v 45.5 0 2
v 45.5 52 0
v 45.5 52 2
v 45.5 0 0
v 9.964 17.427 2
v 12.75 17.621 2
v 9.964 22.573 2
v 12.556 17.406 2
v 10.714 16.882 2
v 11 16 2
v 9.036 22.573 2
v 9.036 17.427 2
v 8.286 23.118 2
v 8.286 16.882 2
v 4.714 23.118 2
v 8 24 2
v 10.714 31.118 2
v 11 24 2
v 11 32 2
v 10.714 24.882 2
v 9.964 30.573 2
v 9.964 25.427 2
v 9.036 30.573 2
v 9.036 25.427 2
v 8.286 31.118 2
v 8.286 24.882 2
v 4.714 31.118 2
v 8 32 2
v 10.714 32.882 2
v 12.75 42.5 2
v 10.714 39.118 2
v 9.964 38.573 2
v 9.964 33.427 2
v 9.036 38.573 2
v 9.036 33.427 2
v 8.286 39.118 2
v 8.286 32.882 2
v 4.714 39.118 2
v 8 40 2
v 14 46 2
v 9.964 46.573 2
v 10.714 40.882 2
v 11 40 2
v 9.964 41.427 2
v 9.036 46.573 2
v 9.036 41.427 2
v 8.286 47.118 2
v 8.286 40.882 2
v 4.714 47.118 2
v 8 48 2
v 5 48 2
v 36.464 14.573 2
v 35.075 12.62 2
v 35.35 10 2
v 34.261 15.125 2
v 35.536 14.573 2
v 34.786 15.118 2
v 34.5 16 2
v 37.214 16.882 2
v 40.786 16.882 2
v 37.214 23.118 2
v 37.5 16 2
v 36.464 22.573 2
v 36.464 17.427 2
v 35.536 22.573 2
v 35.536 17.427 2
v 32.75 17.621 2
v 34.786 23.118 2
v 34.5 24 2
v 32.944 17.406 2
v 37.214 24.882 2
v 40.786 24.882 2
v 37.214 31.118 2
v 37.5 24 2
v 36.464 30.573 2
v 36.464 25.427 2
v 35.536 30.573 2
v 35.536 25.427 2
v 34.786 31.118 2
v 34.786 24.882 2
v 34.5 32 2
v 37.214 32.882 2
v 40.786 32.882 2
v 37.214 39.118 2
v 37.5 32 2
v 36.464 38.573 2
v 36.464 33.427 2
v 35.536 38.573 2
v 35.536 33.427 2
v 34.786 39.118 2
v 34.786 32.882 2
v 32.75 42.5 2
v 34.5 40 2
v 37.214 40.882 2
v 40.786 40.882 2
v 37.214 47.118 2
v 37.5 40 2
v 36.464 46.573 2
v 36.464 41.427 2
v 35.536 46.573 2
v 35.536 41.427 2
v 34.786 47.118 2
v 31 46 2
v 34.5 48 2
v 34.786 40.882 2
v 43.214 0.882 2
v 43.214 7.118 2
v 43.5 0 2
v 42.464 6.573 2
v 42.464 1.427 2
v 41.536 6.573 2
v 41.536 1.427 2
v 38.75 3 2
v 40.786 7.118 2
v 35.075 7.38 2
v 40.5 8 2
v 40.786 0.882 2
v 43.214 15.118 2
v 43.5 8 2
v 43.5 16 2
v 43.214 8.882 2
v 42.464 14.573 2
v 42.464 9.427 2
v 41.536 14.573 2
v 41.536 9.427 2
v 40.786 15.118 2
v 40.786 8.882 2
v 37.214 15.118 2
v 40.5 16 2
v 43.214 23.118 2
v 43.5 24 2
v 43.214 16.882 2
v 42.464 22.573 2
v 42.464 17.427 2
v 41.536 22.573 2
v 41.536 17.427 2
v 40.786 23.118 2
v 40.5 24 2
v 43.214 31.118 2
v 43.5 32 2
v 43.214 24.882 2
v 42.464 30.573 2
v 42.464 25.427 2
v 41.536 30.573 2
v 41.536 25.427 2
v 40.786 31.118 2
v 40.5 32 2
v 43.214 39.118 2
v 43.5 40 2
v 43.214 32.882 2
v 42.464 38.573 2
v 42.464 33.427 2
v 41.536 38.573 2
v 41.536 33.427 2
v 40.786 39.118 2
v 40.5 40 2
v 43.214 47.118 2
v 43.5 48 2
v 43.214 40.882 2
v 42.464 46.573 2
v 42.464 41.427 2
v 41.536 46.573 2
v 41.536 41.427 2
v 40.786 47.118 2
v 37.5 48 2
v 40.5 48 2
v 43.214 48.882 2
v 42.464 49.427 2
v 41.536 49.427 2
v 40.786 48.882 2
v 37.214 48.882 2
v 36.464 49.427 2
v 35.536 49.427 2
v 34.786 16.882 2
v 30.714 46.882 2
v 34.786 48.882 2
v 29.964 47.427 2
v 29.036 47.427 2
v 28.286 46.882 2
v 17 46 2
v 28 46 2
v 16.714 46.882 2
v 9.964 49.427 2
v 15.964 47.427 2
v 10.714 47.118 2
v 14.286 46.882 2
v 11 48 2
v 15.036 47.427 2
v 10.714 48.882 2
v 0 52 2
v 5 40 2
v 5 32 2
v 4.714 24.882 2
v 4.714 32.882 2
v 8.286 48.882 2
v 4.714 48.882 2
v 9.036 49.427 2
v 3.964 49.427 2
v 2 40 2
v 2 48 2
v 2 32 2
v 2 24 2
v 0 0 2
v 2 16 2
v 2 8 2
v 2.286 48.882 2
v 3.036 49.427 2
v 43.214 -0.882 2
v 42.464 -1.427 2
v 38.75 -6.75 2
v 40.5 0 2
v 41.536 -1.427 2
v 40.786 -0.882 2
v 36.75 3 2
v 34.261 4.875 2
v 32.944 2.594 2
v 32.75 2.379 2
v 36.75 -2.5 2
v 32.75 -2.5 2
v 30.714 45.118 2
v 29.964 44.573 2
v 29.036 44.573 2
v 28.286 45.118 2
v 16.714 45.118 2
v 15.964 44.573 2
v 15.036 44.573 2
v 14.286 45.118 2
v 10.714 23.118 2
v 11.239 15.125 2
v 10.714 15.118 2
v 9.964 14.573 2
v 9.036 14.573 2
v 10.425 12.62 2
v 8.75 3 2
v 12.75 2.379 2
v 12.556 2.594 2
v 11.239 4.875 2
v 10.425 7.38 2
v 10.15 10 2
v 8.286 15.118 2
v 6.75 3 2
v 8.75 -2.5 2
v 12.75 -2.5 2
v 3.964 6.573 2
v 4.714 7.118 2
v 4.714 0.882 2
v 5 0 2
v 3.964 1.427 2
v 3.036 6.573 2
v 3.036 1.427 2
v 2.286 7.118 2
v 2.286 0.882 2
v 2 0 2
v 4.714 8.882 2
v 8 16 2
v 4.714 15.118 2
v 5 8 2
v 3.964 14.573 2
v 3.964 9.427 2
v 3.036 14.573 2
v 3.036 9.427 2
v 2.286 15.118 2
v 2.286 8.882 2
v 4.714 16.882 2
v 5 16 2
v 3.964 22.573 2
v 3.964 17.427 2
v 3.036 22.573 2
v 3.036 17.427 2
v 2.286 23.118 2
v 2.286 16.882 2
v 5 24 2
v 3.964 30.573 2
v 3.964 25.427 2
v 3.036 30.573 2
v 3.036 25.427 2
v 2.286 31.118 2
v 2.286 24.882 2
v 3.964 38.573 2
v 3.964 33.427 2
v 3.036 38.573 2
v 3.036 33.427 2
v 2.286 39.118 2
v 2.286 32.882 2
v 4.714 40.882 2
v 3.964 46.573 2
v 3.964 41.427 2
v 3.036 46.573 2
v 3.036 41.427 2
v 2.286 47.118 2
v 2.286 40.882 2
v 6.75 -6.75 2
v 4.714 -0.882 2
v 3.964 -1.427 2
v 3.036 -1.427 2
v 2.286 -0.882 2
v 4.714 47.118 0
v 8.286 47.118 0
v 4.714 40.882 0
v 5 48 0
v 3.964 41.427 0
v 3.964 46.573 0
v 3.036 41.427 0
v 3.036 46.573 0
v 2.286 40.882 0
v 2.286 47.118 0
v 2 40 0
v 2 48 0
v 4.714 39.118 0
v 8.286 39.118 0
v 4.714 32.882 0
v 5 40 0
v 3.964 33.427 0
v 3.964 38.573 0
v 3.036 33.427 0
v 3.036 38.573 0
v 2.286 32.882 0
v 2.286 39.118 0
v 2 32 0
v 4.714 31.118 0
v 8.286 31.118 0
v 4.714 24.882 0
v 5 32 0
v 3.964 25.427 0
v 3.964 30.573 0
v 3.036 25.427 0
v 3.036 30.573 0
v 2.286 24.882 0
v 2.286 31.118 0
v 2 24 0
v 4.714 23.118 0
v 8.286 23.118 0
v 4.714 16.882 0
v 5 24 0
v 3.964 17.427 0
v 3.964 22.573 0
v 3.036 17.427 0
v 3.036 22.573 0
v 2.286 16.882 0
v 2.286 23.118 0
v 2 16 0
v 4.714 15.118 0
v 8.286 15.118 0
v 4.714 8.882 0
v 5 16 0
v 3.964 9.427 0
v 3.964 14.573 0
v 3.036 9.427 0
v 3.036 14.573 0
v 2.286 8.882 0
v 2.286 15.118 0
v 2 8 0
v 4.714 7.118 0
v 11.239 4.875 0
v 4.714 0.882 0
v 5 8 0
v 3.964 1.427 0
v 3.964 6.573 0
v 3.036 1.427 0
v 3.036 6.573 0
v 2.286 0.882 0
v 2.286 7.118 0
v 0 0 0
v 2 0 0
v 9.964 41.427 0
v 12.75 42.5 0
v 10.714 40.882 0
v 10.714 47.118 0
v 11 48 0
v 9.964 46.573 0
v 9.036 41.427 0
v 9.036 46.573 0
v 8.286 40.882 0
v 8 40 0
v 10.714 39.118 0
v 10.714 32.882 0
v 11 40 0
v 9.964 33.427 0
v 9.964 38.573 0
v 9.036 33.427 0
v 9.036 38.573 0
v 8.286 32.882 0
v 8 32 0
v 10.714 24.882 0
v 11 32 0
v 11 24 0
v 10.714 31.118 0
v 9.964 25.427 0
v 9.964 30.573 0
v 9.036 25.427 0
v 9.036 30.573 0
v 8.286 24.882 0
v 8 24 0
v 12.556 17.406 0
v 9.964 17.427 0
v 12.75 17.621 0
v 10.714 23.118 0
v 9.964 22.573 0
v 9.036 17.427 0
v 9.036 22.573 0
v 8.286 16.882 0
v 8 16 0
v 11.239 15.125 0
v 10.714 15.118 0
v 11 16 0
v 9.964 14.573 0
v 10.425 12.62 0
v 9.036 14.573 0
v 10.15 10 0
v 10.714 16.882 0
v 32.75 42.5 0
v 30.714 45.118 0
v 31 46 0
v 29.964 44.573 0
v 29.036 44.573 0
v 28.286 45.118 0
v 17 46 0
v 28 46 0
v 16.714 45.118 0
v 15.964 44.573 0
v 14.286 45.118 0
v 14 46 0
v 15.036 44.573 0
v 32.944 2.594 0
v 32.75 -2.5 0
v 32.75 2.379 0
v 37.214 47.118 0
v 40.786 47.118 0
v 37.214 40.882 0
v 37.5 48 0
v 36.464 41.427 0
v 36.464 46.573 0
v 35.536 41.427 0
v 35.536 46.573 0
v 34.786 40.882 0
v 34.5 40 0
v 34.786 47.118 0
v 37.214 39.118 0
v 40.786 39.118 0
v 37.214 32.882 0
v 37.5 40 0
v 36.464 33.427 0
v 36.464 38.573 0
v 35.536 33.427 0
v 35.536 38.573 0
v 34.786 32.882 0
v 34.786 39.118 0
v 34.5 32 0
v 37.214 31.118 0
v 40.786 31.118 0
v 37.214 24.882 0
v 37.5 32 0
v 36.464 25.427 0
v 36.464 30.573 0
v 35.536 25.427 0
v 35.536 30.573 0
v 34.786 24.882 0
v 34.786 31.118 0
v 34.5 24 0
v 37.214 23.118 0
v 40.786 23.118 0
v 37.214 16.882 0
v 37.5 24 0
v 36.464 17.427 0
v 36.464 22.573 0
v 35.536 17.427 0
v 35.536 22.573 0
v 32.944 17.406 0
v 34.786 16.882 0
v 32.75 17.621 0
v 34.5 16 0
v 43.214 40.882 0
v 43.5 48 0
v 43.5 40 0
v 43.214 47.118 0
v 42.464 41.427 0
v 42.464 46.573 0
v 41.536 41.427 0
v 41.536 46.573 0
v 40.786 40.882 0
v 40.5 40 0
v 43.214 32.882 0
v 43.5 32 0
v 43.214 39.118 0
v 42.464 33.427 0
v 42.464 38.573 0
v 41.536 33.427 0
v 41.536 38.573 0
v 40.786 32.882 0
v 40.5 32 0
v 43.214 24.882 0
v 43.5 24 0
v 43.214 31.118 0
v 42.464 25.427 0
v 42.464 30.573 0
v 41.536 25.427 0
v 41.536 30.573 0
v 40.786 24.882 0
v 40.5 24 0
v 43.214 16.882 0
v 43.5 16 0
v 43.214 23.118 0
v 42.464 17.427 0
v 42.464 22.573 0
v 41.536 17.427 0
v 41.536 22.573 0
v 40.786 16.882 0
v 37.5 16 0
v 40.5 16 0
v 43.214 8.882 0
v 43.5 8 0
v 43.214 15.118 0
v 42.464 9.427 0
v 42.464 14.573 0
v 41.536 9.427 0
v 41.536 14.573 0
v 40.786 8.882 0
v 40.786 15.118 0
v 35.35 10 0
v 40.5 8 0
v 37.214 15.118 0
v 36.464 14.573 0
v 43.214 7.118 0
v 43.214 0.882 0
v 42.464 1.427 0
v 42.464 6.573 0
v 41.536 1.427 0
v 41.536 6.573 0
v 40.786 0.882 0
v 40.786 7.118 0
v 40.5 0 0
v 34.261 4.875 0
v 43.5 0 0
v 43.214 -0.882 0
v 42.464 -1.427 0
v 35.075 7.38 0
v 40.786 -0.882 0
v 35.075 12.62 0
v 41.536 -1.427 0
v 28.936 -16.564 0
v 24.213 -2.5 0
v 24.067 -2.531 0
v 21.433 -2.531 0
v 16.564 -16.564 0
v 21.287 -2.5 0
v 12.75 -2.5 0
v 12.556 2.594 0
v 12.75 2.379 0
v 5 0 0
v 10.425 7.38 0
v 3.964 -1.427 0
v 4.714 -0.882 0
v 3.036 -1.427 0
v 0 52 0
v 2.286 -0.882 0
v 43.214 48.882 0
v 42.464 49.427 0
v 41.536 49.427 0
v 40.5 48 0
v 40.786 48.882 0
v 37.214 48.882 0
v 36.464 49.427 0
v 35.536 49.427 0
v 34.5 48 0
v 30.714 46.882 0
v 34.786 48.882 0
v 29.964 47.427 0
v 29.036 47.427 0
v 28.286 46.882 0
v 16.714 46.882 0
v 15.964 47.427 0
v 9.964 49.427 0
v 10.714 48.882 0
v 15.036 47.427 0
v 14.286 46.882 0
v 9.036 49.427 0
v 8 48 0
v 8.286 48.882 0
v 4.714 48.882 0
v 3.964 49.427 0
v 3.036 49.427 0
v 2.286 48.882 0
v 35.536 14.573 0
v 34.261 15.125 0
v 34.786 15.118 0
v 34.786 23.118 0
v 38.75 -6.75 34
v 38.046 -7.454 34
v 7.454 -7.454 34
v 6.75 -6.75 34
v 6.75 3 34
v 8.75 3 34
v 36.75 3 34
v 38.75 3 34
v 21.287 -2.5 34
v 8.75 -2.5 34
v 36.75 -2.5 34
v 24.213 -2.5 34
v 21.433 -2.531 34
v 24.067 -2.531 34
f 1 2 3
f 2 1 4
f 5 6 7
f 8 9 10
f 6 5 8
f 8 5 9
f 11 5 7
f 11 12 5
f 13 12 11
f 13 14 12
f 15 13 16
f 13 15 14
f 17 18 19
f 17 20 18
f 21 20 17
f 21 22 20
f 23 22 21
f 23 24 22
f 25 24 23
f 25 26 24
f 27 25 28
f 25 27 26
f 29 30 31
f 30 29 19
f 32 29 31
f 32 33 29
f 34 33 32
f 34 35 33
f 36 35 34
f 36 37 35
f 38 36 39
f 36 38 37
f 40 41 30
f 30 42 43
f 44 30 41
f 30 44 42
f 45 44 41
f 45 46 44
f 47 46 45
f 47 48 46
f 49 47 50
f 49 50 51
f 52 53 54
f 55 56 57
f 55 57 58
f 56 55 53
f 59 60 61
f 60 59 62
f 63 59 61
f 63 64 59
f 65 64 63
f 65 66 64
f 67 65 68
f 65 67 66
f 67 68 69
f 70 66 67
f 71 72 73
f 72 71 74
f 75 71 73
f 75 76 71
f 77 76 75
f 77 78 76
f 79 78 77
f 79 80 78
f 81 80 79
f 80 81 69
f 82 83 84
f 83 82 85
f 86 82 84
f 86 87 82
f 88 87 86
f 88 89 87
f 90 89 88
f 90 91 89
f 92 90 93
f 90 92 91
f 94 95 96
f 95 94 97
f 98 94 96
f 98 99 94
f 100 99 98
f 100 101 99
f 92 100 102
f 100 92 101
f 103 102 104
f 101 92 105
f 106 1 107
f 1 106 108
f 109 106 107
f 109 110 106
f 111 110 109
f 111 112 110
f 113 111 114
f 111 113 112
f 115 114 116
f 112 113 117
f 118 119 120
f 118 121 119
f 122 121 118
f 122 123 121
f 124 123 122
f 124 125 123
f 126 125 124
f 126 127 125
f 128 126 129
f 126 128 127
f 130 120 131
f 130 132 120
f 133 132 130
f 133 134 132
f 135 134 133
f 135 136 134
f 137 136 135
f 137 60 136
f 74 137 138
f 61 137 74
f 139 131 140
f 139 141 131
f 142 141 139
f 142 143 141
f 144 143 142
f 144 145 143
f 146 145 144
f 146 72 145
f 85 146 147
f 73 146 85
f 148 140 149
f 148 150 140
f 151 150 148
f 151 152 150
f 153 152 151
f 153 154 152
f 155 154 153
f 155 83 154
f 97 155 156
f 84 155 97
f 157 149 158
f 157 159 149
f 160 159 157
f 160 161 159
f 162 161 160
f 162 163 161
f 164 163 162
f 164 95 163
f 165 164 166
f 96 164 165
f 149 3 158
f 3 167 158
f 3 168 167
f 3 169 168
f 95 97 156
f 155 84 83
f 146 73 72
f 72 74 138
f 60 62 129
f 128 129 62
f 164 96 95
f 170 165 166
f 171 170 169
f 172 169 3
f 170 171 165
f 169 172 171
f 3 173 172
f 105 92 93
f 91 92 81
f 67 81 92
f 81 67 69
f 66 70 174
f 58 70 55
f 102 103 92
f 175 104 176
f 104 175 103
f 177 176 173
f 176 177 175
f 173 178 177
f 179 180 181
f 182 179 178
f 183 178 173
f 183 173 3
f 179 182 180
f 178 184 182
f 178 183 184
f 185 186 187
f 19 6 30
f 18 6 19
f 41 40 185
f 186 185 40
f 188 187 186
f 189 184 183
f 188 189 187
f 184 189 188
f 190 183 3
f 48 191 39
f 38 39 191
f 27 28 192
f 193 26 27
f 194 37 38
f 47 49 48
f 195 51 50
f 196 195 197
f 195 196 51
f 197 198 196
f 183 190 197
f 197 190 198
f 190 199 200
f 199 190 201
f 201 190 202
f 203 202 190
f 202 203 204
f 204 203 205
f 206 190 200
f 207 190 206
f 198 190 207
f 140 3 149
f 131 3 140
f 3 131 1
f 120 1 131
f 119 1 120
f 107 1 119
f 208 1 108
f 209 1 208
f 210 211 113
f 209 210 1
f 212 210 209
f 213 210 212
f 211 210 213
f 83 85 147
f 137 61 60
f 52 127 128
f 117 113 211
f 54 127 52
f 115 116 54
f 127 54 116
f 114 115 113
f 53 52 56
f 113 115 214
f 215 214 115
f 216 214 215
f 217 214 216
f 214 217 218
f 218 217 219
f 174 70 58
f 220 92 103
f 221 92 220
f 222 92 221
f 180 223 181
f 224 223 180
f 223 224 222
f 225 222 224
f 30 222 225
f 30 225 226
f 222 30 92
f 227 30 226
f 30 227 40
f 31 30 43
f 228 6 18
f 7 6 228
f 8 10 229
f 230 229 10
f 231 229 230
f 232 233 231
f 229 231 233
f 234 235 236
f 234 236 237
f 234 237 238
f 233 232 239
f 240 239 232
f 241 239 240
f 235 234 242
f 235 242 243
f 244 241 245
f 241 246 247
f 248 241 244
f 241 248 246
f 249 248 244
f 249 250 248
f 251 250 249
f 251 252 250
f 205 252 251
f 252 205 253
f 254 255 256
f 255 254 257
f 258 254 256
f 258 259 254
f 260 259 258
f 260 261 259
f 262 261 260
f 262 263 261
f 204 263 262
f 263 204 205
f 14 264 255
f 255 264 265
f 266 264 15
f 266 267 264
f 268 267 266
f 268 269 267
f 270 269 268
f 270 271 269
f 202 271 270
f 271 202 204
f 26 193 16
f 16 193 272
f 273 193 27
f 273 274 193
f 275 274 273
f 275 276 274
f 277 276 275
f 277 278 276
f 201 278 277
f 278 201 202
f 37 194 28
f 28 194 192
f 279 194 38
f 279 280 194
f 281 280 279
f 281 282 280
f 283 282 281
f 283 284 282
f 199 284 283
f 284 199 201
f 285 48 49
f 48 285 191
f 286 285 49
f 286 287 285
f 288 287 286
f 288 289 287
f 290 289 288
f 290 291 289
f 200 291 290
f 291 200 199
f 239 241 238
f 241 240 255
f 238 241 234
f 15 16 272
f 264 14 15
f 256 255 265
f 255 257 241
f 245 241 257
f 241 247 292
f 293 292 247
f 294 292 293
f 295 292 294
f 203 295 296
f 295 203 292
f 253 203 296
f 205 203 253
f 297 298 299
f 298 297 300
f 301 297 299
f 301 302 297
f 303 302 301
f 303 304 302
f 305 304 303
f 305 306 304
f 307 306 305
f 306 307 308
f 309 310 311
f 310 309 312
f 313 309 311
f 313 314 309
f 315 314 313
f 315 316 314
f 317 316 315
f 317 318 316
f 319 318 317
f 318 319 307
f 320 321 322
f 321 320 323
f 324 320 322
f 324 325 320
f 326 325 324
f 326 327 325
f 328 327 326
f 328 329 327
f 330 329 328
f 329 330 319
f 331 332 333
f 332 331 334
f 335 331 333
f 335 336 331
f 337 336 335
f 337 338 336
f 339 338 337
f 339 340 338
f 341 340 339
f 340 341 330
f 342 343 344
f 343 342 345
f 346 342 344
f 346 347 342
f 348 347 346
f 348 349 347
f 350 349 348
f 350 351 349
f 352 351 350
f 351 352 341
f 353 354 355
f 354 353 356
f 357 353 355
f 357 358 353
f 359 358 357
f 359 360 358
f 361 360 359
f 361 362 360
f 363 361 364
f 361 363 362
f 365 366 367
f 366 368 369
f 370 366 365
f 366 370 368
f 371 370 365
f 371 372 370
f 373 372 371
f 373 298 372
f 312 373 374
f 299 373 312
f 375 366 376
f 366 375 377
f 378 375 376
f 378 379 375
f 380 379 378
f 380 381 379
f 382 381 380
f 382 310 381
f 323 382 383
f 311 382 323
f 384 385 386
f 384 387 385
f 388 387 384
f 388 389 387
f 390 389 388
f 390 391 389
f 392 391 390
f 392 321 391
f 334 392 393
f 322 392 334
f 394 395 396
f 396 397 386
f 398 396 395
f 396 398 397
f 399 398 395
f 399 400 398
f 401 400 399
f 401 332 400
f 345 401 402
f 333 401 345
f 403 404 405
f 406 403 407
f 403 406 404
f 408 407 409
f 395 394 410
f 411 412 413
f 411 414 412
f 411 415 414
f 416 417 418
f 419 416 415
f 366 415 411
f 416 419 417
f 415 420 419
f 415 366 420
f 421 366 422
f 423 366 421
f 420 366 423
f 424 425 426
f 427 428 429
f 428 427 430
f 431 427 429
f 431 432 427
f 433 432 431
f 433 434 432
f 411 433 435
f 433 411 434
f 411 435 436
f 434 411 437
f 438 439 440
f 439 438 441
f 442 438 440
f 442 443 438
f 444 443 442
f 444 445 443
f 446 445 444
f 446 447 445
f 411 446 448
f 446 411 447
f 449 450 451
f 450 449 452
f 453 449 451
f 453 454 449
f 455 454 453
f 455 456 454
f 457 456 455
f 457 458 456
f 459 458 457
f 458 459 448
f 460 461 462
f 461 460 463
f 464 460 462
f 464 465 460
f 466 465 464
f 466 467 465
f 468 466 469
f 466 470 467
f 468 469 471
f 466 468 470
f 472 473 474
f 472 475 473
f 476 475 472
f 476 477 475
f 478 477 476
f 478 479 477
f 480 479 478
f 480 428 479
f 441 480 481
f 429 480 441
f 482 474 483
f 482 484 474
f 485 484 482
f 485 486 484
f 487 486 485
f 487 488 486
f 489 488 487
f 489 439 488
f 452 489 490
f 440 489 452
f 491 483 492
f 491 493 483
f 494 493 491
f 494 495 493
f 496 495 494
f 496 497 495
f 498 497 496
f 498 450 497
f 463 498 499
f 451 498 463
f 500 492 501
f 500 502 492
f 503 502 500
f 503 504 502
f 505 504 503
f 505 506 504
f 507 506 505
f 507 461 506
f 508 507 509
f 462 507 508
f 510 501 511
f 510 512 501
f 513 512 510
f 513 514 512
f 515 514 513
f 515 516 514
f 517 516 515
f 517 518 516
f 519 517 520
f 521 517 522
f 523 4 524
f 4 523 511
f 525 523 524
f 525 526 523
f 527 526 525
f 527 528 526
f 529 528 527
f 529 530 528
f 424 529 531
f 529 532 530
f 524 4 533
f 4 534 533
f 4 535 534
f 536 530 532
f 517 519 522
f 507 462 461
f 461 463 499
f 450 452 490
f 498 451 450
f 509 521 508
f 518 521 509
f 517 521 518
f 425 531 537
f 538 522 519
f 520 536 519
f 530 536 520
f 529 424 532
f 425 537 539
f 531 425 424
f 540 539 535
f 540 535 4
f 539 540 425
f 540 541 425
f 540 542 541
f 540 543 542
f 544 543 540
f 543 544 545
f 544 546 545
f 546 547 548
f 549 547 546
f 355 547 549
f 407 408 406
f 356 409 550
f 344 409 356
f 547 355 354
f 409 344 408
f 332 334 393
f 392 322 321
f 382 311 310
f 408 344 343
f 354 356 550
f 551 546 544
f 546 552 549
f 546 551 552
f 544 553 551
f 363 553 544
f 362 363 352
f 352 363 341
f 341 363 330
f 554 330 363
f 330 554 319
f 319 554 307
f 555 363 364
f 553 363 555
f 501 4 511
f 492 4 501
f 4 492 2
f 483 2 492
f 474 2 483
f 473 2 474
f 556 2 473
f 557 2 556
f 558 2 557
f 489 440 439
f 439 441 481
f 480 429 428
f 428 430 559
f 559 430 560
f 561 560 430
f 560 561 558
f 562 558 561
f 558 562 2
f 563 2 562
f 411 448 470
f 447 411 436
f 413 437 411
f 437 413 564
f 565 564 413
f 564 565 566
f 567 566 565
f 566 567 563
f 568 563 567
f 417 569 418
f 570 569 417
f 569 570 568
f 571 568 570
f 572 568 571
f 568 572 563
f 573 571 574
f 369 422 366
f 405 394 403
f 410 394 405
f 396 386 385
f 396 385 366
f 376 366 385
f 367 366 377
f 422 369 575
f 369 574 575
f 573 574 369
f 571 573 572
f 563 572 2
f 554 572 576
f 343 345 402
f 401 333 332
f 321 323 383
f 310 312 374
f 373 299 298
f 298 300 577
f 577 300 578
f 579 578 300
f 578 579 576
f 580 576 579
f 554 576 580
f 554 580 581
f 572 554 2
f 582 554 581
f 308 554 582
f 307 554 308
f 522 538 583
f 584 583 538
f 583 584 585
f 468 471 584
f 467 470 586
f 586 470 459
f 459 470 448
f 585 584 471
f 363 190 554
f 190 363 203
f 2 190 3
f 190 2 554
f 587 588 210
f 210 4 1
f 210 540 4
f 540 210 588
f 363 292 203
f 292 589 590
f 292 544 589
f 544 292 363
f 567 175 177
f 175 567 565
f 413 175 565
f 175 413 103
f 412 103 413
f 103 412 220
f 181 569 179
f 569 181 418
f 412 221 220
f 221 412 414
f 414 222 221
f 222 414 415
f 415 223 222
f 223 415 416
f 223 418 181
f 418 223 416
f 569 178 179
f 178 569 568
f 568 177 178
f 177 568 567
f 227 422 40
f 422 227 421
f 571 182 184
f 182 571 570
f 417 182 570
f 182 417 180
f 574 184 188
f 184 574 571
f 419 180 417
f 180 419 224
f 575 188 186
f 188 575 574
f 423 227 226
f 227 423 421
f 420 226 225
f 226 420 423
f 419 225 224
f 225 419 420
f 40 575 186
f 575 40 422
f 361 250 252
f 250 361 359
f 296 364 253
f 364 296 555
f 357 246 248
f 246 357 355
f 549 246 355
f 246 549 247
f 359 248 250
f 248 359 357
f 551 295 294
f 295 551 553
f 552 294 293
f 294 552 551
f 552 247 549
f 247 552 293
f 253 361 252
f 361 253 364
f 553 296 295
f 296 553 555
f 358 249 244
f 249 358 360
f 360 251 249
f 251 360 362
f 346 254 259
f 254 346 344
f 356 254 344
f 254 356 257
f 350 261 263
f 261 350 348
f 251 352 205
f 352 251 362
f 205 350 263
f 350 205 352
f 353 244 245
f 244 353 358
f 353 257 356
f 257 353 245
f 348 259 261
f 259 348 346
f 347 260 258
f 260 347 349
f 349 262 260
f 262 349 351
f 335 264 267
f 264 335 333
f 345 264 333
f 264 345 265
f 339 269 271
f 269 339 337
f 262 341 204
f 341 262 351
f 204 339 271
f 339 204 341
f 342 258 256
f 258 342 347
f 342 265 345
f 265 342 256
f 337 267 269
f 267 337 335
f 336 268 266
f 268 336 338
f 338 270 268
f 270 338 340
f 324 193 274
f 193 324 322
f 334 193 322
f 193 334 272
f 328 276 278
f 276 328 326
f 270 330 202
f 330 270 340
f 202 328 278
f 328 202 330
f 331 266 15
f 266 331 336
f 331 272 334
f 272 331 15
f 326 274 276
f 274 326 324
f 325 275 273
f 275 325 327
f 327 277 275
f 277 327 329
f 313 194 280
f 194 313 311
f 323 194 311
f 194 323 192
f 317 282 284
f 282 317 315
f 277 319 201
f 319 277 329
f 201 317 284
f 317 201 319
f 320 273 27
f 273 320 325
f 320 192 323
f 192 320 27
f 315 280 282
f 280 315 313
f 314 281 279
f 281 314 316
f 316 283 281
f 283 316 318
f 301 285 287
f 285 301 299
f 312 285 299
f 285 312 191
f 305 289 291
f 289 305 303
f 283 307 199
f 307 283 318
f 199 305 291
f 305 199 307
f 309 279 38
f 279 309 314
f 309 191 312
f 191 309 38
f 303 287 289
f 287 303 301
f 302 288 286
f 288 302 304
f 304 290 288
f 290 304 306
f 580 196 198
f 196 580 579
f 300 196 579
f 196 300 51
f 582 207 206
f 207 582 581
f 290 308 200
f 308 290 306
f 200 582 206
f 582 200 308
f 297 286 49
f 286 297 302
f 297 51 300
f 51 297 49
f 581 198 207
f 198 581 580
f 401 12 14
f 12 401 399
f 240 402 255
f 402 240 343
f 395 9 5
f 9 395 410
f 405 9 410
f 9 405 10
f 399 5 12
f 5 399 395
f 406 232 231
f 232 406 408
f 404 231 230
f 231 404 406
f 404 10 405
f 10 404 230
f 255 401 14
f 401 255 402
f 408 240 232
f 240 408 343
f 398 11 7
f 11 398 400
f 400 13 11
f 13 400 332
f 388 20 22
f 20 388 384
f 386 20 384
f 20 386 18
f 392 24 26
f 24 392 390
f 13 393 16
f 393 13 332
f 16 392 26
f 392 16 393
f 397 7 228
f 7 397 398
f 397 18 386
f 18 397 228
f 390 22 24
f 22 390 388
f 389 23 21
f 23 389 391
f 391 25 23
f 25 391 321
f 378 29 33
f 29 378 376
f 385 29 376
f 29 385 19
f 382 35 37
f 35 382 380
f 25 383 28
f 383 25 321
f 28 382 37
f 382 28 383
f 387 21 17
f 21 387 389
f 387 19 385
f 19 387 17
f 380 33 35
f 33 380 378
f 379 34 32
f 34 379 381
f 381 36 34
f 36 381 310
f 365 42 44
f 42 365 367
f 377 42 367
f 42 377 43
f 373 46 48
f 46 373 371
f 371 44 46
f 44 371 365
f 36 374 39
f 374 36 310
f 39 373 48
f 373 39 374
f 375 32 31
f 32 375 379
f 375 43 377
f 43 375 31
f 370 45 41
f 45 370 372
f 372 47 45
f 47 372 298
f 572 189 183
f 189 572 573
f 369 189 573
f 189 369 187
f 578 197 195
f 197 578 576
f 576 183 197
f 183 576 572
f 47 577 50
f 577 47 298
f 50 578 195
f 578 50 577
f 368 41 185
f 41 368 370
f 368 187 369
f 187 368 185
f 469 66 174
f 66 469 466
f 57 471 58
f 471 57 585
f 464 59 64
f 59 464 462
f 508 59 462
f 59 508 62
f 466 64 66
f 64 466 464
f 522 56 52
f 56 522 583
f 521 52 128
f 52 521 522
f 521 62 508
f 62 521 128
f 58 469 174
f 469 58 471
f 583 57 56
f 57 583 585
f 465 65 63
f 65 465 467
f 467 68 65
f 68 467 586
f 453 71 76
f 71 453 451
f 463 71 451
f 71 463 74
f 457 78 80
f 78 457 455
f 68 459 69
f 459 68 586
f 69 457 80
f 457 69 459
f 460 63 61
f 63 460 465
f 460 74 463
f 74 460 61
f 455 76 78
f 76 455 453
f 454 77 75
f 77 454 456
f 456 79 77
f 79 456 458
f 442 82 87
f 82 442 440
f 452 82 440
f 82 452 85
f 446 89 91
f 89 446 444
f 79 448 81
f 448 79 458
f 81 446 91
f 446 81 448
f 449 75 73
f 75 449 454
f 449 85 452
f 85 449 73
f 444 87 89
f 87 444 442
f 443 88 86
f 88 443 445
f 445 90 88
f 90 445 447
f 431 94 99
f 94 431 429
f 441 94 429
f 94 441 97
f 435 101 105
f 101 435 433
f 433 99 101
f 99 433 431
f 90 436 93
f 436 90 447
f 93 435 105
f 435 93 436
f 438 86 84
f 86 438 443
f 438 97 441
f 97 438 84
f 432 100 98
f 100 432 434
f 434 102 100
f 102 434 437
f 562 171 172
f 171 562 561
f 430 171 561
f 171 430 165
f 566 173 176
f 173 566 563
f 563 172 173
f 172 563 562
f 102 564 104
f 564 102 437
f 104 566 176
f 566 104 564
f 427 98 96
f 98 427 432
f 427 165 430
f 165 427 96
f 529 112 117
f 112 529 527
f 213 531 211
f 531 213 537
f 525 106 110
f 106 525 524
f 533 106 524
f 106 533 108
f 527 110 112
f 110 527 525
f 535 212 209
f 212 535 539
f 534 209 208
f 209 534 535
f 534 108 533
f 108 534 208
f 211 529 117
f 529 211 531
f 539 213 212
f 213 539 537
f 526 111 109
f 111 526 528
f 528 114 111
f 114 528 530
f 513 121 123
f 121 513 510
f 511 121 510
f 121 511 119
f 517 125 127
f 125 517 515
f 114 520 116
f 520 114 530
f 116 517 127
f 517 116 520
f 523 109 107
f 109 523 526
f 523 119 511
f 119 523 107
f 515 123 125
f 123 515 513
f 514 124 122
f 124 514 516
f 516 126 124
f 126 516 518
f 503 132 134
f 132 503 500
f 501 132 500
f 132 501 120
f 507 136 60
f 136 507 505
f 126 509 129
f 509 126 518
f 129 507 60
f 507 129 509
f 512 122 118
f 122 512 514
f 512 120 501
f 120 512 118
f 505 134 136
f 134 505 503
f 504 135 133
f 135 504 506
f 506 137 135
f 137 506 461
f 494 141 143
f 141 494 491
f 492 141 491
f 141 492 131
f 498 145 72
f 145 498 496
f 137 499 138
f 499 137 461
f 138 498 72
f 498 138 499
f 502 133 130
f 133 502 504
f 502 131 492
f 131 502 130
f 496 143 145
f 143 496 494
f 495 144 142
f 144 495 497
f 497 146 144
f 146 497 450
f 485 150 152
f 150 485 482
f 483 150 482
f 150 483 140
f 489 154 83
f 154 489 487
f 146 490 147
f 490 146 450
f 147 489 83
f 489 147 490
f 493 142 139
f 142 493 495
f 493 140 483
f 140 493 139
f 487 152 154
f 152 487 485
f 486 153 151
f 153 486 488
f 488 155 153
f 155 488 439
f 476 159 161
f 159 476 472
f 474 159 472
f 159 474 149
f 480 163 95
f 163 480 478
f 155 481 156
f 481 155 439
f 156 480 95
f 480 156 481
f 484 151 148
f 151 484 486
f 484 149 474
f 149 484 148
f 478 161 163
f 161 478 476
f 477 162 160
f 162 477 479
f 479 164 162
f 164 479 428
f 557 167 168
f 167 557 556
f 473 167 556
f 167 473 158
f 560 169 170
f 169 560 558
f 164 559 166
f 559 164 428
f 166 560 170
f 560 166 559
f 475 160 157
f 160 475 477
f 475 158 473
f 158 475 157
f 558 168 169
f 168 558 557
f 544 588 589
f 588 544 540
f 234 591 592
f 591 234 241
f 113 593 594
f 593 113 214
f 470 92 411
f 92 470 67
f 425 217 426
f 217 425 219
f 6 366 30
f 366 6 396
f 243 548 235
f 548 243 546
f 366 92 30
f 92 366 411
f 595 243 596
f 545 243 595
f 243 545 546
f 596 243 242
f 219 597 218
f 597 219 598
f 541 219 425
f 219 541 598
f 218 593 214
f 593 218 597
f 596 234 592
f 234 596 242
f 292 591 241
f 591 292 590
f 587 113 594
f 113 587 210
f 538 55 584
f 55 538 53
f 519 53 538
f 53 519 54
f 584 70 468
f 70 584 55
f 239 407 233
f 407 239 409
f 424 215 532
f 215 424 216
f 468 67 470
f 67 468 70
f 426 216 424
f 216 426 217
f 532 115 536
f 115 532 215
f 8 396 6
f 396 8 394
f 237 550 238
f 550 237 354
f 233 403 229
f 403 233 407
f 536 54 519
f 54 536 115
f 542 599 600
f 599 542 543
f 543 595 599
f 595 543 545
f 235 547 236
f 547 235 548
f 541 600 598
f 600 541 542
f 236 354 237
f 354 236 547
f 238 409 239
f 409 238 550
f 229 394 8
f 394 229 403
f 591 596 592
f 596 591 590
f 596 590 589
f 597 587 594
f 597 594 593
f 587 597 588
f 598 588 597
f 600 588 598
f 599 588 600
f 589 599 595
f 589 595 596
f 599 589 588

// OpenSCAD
module agujereado(X,Y){
	union(){
		for(j=[0:X])
		{
			translate([0,j*8,0])
			{
				for(i=[0:Y])
				{
					translate([i*6,0,-1])cylinder(r=1.5, h=8, $fn=10);
				}
			}
		}
	}
}

module pieza(){
difference(){
union(){
cube([45.5,52,2]);
translate([45.5/2,0,0])cylinder(r=45.5/2,h=35,$fn=4);
}
rotate([-15,0,0])translate([0,-66,-10])cube([45.5,50,100]);
translate([-1,3,2])cube([47,65,36]);

translate([(45.5-20)/2,-2.5,-1])cube([20,45,40]);
translate([(45.5-20)/2-4,-2.5,2])cube([28,8,40]);


translate([0,-20,2])cube([(45.5-32)/2,70,70]);
translate([45.5-(45.5-32)/2,-20,2])cube([(45.5-32)/2,70,70]);
translate([22.5,46,0])union(){
	translate([7,0,-1])cylinder(r=1.5, h=5, $fn=10);
	translate([-7,0,-1])cylinder(r=1.5, h=5, $fn=10);
}

translate([3.5,0,0])agujereado(6,0);
translate([3.5+6,16,0])agujereado(4,0);
translate([9.5+26.5,16,0])agujereado(4,0);
translate([9.5+32.5,0,0])agujereado(6,0);

translate([45.5/2,10,-1])cylinder(r=12.6,h=40);
//translate([-9.75,30,-1])cylinder(r=12.6,h=40);
//translate([55.25,30,-1])cylinder(r=12.6,h=40);

translate([-50,-50,34])cube(100);

}
}

pieza();
